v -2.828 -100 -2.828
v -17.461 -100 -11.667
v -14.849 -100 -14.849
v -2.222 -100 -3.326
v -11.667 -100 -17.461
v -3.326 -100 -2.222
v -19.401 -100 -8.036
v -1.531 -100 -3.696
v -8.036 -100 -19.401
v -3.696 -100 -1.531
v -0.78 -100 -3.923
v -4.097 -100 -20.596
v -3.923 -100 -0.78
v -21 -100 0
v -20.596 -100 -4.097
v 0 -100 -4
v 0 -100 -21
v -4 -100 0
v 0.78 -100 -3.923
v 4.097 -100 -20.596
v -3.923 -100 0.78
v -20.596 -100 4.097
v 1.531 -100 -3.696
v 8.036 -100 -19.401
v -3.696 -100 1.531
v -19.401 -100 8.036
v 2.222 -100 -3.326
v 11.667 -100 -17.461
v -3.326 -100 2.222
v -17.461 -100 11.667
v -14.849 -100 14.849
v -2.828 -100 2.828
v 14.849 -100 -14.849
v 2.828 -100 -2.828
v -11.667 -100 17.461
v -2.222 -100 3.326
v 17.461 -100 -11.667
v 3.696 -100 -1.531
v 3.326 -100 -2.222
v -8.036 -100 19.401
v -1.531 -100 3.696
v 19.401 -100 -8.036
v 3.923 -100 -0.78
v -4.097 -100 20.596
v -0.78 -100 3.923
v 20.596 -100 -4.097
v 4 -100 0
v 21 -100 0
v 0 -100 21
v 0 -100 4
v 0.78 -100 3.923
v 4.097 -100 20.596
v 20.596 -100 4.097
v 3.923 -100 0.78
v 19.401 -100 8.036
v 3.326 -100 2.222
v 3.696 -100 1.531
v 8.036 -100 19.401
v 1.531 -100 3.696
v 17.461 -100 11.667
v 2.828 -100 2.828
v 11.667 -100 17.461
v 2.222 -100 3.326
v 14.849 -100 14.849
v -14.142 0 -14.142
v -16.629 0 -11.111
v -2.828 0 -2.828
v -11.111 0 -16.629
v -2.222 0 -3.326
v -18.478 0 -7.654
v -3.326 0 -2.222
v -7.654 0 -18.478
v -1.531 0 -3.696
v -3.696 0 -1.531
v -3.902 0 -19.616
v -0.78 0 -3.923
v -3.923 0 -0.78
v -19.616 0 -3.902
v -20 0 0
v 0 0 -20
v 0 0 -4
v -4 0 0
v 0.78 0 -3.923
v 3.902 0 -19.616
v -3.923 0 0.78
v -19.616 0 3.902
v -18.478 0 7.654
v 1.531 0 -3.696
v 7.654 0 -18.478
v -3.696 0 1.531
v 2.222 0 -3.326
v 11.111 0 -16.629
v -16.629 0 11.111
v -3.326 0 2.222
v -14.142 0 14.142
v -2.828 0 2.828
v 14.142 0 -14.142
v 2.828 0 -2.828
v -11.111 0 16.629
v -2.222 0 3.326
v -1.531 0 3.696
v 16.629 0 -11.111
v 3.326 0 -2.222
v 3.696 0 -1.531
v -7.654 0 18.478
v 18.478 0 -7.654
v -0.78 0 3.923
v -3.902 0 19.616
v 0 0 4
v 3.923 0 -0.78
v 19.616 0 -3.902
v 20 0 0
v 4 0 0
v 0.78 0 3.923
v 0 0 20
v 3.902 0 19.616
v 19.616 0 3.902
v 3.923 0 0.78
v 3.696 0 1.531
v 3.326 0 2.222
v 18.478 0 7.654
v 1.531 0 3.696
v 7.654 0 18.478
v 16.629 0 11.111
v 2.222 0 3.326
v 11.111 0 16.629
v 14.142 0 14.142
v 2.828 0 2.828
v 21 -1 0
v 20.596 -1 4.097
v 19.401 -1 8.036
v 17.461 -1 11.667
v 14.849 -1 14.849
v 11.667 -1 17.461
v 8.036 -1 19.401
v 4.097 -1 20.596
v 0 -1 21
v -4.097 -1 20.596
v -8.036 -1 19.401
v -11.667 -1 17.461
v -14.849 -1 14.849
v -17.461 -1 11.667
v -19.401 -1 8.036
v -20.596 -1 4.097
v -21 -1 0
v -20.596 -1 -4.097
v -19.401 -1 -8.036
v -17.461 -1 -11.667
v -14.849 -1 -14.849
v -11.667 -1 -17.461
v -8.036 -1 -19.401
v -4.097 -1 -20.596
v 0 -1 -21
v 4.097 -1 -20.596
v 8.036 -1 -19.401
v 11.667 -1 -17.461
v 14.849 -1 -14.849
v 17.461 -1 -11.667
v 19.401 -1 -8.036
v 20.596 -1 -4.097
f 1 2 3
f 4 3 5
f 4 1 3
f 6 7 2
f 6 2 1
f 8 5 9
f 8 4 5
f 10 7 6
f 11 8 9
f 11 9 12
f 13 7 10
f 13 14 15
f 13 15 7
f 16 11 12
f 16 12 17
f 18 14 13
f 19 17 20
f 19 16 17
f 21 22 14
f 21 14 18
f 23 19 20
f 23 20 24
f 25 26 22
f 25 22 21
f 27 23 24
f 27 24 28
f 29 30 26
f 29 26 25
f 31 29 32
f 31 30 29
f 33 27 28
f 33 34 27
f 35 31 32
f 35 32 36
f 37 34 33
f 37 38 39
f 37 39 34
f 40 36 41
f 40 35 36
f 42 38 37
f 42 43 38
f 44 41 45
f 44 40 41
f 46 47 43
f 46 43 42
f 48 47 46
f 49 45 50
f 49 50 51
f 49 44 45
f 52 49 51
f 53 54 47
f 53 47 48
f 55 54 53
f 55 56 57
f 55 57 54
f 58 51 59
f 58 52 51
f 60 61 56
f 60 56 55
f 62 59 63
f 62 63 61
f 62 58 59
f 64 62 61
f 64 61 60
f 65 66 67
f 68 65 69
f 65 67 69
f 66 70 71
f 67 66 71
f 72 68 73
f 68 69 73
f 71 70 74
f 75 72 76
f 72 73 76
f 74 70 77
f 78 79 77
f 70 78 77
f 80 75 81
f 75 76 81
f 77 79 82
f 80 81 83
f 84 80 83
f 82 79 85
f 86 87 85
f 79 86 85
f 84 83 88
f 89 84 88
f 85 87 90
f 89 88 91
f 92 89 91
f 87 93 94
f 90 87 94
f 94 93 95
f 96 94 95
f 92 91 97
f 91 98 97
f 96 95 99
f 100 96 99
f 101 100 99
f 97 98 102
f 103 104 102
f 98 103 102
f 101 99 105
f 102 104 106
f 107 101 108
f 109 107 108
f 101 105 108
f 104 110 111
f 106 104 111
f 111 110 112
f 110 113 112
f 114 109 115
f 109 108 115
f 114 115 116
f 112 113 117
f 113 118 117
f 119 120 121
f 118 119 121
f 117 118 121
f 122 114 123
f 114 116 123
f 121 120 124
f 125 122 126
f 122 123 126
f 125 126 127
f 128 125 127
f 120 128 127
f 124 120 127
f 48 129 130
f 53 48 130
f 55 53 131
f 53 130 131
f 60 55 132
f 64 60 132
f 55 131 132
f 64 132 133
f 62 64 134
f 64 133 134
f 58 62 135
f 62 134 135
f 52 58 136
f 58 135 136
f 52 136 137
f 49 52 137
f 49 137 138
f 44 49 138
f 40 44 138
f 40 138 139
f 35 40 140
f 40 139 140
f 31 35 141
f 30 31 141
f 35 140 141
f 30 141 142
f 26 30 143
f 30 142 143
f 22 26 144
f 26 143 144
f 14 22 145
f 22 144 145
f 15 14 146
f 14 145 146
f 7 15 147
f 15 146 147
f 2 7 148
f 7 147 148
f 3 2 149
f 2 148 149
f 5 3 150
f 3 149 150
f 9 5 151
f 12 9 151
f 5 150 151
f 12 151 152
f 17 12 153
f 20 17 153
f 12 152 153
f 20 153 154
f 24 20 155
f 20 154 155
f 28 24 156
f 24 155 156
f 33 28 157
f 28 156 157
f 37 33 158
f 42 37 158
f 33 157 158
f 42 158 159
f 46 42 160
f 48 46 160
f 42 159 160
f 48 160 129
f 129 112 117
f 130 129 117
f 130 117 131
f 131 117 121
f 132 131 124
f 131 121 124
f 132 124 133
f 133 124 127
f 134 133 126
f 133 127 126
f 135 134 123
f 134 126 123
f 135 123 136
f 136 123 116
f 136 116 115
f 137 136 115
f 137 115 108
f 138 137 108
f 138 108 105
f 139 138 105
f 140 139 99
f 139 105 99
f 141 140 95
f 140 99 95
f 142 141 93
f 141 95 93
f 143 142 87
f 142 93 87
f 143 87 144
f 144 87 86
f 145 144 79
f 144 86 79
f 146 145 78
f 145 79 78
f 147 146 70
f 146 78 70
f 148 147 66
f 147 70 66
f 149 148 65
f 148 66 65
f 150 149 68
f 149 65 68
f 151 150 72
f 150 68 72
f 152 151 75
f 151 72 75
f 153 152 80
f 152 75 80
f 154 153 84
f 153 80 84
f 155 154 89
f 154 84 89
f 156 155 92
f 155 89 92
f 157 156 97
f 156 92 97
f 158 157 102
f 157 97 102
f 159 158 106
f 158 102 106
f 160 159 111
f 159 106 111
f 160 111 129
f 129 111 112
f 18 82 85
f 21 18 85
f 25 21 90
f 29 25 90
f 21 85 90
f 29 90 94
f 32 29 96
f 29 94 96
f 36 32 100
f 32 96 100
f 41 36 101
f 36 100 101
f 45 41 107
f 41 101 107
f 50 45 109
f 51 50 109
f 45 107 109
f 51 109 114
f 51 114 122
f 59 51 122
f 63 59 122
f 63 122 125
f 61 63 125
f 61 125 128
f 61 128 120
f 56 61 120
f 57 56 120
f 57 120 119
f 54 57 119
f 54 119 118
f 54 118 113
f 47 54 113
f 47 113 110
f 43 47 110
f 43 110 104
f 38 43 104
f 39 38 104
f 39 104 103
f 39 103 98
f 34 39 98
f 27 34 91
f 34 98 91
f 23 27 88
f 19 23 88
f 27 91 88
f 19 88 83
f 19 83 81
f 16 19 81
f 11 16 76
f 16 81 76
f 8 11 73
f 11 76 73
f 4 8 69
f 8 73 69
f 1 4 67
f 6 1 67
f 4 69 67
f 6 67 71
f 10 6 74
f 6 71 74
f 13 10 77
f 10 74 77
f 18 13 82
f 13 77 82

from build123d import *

# Parameters (mm, degrees)
F0_R     = 21
F1_DEPTH = 100
F2_SIZE  = 1
F3_R     = 4
F4_DEPTH = 100.001


with BuildPart() as f1:
    # F0 (on Front) → F1 (new body)
    with BuildSketch(Plane.XZ):
        Circle(F0_R)
    extrude(amount=F1_DEPTH)

    # F2
    f2_edges = [f1.edges().sort_by_distance(p)[0] for p in [
        (-21, 0, 0),
    ]]
    chamfer(f2_edges, length=F2_SIZE)

    # F3 (on face) → F4 (cut, through all)
    with BuildSketch(Plane(origin=(0, 0, 0), x_dir=(-1, 0, 0), z_dir=(0, 1, 0))):
        Circle(F3_R)
    extrude(amount=-F4_DEPTH, mode=Mode.SUBTRACT)


solid = f1.part
